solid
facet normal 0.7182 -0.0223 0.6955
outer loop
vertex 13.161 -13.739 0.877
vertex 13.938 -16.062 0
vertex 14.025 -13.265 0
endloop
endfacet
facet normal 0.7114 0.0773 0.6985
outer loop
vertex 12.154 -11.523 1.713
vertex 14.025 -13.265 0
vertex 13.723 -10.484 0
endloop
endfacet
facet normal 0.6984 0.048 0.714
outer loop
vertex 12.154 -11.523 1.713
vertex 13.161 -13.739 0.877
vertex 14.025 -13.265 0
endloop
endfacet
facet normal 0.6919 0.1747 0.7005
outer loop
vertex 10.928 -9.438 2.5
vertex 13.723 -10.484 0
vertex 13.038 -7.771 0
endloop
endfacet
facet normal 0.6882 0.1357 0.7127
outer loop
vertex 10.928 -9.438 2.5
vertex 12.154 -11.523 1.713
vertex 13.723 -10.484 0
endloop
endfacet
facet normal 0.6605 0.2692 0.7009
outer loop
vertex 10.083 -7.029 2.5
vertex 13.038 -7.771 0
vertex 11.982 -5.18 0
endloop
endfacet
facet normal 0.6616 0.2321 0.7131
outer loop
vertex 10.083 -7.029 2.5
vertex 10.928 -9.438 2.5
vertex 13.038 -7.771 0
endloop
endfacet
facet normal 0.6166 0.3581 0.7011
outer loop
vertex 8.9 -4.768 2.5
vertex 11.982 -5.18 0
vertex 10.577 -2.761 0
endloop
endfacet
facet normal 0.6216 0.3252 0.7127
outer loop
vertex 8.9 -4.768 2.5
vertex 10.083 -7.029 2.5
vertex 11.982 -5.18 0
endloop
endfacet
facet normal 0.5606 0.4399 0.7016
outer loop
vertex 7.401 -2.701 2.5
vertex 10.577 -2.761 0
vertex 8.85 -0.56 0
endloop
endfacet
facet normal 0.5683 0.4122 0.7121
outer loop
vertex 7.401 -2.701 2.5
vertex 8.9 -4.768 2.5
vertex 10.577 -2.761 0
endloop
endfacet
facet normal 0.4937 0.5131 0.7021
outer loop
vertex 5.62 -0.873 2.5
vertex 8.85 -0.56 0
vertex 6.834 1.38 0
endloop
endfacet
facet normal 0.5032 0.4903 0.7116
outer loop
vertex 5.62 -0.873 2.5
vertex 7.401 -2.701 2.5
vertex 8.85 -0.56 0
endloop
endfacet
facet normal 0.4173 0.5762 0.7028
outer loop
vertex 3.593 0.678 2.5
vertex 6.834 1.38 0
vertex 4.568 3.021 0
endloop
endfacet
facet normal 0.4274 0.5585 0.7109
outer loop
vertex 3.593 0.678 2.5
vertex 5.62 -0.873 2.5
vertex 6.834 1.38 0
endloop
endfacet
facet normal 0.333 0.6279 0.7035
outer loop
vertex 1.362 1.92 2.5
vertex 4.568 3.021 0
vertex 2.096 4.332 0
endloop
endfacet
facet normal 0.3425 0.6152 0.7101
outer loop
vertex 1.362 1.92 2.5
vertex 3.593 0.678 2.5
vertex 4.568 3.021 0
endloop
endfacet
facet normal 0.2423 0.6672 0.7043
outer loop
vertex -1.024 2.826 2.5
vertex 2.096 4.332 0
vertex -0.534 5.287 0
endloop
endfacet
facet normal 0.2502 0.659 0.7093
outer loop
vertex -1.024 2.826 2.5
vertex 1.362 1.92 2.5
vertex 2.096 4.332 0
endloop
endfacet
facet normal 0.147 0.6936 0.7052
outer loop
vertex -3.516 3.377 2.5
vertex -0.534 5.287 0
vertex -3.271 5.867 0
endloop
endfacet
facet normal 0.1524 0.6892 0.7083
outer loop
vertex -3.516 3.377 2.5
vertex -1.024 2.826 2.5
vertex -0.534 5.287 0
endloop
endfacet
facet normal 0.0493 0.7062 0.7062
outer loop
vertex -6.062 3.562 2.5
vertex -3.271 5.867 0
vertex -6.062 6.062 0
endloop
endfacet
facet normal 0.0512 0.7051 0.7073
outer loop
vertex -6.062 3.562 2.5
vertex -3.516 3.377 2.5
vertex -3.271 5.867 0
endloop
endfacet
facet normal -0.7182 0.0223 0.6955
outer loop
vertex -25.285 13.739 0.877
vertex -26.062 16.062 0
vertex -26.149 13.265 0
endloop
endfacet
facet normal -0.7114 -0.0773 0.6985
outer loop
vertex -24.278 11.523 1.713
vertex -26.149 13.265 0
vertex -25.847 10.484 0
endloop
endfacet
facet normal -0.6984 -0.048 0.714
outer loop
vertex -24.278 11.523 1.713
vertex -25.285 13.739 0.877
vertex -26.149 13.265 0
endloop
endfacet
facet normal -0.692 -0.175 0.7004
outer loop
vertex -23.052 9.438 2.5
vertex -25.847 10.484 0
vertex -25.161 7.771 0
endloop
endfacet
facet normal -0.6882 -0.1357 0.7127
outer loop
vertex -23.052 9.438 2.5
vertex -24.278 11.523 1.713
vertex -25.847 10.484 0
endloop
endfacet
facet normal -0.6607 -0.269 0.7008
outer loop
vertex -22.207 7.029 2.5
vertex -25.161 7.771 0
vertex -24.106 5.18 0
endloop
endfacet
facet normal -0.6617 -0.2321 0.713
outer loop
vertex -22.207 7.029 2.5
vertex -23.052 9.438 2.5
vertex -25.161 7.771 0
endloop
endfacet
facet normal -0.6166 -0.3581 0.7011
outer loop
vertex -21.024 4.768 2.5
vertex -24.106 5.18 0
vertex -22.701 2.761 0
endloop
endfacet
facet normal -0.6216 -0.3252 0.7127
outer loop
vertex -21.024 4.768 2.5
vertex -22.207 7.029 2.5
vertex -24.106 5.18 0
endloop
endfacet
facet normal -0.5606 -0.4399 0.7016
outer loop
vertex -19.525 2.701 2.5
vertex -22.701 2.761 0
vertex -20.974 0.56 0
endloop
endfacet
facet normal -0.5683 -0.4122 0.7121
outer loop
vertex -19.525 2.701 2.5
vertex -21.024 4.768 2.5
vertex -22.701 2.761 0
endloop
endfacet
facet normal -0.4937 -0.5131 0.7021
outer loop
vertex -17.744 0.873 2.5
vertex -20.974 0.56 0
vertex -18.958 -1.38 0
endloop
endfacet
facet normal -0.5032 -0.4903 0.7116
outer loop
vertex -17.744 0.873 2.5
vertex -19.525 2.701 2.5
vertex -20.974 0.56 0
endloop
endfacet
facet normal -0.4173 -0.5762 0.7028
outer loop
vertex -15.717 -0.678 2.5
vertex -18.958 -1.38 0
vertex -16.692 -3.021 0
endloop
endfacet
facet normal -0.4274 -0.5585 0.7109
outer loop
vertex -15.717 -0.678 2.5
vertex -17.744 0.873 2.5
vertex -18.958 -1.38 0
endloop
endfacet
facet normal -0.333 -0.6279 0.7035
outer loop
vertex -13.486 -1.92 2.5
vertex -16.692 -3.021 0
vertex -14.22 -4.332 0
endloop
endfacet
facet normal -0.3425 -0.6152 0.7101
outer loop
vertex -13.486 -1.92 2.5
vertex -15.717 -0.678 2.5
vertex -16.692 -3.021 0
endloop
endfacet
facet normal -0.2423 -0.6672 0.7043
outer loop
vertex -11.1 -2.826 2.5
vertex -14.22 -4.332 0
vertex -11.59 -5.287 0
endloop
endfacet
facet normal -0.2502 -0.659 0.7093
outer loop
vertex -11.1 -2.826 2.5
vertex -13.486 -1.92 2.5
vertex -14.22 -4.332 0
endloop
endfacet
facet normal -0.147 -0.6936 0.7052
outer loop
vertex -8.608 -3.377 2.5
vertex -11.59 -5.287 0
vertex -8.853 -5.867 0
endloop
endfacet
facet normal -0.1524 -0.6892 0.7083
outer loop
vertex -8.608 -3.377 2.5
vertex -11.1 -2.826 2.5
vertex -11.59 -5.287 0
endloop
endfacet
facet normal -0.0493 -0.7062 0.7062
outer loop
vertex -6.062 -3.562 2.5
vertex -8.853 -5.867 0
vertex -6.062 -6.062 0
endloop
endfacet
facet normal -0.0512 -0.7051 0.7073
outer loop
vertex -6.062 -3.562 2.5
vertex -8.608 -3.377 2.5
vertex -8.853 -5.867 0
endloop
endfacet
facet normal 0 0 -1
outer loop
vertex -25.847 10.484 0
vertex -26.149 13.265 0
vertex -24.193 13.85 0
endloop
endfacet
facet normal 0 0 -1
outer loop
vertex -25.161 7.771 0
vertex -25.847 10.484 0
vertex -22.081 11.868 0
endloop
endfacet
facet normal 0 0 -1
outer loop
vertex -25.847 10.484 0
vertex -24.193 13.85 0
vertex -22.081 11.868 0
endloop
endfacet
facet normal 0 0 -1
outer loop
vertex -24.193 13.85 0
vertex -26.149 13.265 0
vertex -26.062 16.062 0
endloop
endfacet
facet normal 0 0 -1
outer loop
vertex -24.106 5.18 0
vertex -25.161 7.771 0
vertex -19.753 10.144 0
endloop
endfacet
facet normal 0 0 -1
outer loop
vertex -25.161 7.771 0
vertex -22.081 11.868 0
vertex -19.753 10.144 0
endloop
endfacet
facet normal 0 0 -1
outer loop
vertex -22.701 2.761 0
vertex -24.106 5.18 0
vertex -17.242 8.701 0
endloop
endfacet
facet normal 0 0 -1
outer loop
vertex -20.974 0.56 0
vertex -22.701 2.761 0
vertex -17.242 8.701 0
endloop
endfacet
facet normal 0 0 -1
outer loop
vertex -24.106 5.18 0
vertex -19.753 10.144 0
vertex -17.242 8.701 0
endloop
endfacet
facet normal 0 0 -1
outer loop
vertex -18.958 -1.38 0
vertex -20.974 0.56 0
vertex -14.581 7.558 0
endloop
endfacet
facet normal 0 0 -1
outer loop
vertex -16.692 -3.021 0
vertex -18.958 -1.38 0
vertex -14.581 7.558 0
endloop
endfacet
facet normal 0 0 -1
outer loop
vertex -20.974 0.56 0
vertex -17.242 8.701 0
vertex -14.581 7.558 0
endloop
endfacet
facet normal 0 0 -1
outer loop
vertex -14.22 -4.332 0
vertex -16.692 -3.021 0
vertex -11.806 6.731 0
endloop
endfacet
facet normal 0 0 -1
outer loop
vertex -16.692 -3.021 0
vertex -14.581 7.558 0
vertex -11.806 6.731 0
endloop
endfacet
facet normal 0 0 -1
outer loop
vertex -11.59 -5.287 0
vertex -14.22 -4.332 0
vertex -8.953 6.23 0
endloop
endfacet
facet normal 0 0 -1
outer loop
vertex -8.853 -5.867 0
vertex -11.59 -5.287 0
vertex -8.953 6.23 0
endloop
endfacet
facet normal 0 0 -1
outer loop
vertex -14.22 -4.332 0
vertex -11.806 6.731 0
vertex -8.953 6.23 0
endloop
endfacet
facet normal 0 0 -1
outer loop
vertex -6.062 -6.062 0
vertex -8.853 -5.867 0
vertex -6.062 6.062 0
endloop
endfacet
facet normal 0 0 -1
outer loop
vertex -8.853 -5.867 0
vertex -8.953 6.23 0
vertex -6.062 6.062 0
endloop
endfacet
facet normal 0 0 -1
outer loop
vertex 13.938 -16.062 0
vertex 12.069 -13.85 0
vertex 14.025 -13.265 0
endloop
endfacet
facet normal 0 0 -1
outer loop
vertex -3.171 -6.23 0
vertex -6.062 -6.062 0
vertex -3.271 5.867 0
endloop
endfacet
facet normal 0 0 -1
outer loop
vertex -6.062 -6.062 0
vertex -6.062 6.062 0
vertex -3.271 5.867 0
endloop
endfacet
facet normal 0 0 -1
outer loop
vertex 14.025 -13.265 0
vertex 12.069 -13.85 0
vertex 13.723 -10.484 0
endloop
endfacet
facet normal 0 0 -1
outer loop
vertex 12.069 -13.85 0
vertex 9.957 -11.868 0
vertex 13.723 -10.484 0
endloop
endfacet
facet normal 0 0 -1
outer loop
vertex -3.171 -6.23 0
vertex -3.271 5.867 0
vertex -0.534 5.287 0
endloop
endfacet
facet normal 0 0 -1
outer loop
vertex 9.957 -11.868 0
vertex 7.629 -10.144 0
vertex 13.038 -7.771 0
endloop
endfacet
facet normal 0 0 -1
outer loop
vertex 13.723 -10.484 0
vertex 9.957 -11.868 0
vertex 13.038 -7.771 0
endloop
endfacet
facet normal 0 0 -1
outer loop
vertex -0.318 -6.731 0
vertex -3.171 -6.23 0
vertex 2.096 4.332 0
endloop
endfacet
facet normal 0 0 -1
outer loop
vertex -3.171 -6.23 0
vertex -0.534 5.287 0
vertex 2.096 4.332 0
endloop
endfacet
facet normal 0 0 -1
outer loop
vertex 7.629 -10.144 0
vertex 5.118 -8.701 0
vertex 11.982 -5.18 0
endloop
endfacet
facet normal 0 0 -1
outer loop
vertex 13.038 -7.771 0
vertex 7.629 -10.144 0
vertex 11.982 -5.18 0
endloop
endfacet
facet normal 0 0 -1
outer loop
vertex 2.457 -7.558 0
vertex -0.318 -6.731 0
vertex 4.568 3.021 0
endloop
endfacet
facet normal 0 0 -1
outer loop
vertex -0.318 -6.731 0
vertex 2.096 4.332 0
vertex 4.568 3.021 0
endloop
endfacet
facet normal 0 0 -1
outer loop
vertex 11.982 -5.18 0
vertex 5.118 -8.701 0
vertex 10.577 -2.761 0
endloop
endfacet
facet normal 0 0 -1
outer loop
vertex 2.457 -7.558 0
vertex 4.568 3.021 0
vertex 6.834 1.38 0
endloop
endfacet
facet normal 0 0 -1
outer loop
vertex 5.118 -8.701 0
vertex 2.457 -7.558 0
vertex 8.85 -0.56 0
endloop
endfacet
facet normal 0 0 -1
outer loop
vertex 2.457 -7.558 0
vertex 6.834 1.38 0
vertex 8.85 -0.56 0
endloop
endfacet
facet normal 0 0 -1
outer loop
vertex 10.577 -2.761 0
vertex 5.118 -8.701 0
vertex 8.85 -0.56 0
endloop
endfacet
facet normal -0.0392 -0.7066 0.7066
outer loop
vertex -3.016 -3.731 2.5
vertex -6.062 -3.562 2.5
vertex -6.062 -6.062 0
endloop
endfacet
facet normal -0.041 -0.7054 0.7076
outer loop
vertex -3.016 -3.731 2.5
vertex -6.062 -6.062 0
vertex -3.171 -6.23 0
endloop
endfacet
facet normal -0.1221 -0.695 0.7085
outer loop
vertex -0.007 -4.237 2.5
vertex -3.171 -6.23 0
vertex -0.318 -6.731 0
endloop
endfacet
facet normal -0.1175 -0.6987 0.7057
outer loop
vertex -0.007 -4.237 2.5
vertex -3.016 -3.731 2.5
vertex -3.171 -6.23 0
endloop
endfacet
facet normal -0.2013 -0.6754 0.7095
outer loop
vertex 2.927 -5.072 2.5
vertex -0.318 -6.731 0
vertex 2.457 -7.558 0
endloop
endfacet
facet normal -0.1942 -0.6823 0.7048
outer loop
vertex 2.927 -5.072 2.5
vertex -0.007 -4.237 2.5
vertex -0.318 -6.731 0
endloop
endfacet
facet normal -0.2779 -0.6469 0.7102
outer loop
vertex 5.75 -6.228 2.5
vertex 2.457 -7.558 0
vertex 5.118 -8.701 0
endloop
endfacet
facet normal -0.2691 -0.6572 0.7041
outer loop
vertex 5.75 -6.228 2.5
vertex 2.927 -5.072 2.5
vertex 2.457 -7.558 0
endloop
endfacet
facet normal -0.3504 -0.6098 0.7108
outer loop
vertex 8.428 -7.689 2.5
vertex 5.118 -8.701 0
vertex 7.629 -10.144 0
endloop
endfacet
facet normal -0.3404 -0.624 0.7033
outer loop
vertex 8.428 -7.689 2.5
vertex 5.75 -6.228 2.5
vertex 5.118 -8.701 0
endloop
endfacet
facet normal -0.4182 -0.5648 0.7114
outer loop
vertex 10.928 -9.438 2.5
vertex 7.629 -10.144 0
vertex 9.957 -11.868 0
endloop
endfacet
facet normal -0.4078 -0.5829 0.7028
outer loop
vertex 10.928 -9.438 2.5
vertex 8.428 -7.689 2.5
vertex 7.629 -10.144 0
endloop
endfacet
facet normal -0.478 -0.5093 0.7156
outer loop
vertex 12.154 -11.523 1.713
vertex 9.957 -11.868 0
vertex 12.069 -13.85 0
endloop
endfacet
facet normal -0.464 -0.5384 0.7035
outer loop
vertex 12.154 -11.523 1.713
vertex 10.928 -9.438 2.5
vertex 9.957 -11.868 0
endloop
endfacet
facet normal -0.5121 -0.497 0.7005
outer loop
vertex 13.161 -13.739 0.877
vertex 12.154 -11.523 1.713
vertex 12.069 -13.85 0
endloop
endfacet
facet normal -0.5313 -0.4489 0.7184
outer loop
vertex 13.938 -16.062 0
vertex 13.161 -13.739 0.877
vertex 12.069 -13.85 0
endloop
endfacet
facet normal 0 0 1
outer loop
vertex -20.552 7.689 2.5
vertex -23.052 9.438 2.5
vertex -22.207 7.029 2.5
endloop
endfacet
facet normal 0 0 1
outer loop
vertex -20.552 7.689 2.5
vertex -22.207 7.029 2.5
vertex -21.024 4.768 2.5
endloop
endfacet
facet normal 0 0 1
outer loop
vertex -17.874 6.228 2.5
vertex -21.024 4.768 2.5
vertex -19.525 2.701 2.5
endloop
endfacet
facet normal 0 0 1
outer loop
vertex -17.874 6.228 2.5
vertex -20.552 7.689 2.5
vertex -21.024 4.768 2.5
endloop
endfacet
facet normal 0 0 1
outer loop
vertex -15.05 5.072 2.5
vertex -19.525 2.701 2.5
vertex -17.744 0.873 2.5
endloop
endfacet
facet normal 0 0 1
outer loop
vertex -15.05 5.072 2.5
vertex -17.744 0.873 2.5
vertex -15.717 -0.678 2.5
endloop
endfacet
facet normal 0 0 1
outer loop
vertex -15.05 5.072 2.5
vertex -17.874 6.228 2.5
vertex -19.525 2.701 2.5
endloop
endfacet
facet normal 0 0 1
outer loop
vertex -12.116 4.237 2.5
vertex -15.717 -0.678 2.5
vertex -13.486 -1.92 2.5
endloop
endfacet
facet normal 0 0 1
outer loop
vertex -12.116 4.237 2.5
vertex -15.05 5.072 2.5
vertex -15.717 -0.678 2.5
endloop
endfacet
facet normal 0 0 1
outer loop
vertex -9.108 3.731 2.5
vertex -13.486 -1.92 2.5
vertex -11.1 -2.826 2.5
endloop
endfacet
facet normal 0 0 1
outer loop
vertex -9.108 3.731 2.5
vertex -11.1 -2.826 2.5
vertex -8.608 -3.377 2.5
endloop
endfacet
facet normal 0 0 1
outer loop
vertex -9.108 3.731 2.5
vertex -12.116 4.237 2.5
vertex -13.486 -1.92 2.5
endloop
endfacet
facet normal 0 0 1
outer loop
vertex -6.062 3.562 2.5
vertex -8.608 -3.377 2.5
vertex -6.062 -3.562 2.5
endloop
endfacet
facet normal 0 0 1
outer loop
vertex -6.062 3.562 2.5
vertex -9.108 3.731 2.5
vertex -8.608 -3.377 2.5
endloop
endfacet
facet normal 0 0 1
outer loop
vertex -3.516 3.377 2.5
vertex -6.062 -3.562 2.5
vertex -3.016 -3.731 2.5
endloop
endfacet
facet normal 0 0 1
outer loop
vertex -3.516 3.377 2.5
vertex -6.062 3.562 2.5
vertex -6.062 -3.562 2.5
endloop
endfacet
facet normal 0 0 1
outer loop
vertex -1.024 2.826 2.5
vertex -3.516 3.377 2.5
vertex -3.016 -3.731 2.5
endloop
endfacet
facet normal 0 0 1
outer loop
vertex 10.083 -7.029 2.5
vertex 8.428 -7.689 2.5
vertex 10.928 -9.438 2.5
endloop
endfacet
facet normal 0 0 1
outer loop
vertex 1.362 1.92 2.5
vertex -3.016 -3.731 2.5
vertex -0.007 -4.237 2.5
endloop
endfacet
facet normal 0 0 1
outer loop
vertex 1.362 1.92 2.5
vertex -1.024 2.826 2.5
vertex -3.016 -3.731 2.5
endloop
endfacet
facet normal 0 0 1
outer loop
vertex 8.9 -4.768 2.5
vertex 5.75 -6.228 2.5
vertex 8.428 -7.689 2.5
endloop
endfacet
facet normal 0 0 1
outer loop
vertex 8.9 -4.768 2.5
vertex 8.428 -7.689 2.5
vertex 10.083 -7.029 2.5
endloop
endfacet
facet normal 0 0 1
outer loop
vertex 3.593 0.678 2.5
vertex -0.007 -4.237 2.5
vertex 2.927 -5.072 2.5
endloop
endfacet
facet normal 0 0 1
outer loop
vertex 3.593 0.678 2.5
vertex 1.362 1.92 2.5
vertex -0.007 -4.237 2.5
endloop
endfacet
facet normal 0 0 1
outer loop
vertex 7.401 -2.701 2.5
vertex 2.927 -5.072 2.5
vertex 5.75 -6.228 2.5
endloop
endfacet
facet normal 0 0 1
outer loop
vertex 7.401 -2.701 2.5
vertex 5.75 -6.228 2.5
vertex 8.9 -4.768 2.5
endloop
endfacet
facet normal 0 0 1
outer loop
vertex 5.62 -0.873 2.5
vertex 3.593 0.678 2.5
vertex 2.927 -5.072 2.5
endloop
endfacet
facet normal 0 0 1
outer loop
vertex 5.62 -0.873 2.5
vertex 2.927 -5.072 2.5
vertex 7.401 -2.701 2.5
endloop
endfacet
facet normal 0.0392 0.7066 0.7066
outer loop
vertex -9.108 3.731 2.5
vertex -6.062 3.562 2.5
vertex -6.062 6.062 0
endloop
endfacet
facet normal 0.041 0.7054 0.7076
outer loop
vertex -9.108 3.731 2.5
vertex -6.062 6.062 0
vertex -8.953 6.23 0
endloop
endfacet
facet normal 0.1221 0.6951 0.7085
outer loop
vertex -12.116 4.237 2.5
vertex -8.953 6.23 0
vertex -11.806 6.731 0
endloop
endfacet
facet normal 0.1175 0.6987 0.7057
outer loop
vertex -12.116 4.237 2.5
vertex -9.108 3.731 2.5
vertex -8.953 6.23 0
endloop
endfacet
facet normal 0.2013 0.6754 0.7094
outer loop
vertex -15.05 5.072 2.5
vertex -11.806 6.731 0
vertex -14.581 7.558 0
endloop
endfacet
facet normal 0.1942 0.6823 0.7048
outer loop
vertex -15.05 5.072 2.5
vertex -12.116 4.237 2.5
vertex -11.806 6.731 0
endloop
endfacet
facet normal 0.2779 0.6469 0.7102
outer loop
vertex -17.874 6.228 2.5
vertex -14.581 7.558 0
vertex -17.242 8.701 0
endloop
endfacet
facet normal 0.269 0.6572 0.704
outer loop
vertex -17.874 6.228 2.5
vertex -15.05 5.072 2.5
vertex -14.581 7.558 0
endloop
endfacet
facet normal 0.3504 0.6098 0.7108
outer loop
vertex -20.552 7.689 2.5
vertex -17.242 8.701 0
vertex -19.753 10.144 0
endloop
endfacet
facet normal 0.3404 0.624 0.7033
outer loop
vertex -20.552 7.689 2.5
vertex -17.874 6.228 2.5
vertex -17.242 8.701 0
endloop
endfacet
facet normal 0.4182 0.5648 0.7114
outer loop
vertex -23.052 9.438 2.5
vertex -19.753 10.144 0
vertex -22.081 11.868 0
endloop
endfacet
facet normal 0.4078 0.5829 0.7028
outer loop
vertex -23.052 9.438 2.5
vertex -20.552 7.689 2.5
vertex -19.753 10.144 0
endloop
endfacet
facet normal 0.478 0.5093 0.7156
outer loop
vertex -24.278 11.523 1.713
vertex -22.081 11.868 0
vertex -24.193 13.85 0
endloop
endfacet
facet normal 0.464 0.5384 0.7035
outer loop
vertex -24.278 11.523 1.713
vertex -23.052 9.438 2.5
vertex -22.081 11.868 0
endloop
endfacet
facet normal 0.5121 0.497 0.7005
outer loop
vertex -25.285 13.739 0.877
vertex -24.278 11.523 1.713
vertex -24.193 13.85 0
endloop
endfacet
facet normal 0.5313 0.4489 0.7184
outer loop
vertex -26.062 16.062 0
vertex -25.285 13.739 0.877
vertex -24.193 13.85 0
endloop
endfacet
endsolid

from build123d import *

# Parameters (mm, degrees)
F1_DEPTH = 2.5
F2_DEPTH = 2.5
F3_SIZE  = 2.49999


# Not quite as in the source:
# - a fillet or chamfer is up to 0.001 mm smaller than in the source, because OpenCascade refuses the exact size
# - a feature names something its author has since deleted; it is built from what else it names


with BuildPart() as f1:
    # F0 (on Top) → F1 (new body)
    with BuildSketch(Plane.XY):
        with BuildLine():
            ThreePointArc((-26.0619375711, 16.0619375711), (-20.9738946132, 0.5595870881), (-6.0619375711, -6.0619375711))
            Line((-6.0619375711, -6.0619375711), (-6.0619375711, 6.0619375711))
            ThreePointArc((-6.0619375711, 6.0619375711), (-17.2422774586, 8.7012577961), (-26.0619375711, 16.0619375711))
        make_face()
    extrude(amount=F1_DEPTH)

    # F0 (on Top) → F2 (join)
    with BuildSketch(Plane.XY):
        with BuildLine():
            Line((-6.0619375711, 6.0619375711), (-6.0619375711, -6.0619375711))
            ThreePointArc((-6.0619375711, -6.0619375711), (5.1184023164, -8.7012577961), (13.9380624289, -16.0619375711))
            ThreePointArc((13.9380624289, -16.0619375711), (8.8500194711, -0.5595870881), (-6.0619375711, 6.0619375711))
        make_face()
    extrude(amount=F2_DEPTH)

    # F3 (size 2.5 in the source; OpenCascade refuses exactly that, so slightly less here)
    f3_edges = [f1.edges().sort_by_distance(p)[0] for p in [
        (-20.973895, 0.559587, 2.5),
        (8.850019, -0.559587, 2.5),
    ]]
    chamfer(f3_edges, length=F3_SIZE)


solid = f1.part
